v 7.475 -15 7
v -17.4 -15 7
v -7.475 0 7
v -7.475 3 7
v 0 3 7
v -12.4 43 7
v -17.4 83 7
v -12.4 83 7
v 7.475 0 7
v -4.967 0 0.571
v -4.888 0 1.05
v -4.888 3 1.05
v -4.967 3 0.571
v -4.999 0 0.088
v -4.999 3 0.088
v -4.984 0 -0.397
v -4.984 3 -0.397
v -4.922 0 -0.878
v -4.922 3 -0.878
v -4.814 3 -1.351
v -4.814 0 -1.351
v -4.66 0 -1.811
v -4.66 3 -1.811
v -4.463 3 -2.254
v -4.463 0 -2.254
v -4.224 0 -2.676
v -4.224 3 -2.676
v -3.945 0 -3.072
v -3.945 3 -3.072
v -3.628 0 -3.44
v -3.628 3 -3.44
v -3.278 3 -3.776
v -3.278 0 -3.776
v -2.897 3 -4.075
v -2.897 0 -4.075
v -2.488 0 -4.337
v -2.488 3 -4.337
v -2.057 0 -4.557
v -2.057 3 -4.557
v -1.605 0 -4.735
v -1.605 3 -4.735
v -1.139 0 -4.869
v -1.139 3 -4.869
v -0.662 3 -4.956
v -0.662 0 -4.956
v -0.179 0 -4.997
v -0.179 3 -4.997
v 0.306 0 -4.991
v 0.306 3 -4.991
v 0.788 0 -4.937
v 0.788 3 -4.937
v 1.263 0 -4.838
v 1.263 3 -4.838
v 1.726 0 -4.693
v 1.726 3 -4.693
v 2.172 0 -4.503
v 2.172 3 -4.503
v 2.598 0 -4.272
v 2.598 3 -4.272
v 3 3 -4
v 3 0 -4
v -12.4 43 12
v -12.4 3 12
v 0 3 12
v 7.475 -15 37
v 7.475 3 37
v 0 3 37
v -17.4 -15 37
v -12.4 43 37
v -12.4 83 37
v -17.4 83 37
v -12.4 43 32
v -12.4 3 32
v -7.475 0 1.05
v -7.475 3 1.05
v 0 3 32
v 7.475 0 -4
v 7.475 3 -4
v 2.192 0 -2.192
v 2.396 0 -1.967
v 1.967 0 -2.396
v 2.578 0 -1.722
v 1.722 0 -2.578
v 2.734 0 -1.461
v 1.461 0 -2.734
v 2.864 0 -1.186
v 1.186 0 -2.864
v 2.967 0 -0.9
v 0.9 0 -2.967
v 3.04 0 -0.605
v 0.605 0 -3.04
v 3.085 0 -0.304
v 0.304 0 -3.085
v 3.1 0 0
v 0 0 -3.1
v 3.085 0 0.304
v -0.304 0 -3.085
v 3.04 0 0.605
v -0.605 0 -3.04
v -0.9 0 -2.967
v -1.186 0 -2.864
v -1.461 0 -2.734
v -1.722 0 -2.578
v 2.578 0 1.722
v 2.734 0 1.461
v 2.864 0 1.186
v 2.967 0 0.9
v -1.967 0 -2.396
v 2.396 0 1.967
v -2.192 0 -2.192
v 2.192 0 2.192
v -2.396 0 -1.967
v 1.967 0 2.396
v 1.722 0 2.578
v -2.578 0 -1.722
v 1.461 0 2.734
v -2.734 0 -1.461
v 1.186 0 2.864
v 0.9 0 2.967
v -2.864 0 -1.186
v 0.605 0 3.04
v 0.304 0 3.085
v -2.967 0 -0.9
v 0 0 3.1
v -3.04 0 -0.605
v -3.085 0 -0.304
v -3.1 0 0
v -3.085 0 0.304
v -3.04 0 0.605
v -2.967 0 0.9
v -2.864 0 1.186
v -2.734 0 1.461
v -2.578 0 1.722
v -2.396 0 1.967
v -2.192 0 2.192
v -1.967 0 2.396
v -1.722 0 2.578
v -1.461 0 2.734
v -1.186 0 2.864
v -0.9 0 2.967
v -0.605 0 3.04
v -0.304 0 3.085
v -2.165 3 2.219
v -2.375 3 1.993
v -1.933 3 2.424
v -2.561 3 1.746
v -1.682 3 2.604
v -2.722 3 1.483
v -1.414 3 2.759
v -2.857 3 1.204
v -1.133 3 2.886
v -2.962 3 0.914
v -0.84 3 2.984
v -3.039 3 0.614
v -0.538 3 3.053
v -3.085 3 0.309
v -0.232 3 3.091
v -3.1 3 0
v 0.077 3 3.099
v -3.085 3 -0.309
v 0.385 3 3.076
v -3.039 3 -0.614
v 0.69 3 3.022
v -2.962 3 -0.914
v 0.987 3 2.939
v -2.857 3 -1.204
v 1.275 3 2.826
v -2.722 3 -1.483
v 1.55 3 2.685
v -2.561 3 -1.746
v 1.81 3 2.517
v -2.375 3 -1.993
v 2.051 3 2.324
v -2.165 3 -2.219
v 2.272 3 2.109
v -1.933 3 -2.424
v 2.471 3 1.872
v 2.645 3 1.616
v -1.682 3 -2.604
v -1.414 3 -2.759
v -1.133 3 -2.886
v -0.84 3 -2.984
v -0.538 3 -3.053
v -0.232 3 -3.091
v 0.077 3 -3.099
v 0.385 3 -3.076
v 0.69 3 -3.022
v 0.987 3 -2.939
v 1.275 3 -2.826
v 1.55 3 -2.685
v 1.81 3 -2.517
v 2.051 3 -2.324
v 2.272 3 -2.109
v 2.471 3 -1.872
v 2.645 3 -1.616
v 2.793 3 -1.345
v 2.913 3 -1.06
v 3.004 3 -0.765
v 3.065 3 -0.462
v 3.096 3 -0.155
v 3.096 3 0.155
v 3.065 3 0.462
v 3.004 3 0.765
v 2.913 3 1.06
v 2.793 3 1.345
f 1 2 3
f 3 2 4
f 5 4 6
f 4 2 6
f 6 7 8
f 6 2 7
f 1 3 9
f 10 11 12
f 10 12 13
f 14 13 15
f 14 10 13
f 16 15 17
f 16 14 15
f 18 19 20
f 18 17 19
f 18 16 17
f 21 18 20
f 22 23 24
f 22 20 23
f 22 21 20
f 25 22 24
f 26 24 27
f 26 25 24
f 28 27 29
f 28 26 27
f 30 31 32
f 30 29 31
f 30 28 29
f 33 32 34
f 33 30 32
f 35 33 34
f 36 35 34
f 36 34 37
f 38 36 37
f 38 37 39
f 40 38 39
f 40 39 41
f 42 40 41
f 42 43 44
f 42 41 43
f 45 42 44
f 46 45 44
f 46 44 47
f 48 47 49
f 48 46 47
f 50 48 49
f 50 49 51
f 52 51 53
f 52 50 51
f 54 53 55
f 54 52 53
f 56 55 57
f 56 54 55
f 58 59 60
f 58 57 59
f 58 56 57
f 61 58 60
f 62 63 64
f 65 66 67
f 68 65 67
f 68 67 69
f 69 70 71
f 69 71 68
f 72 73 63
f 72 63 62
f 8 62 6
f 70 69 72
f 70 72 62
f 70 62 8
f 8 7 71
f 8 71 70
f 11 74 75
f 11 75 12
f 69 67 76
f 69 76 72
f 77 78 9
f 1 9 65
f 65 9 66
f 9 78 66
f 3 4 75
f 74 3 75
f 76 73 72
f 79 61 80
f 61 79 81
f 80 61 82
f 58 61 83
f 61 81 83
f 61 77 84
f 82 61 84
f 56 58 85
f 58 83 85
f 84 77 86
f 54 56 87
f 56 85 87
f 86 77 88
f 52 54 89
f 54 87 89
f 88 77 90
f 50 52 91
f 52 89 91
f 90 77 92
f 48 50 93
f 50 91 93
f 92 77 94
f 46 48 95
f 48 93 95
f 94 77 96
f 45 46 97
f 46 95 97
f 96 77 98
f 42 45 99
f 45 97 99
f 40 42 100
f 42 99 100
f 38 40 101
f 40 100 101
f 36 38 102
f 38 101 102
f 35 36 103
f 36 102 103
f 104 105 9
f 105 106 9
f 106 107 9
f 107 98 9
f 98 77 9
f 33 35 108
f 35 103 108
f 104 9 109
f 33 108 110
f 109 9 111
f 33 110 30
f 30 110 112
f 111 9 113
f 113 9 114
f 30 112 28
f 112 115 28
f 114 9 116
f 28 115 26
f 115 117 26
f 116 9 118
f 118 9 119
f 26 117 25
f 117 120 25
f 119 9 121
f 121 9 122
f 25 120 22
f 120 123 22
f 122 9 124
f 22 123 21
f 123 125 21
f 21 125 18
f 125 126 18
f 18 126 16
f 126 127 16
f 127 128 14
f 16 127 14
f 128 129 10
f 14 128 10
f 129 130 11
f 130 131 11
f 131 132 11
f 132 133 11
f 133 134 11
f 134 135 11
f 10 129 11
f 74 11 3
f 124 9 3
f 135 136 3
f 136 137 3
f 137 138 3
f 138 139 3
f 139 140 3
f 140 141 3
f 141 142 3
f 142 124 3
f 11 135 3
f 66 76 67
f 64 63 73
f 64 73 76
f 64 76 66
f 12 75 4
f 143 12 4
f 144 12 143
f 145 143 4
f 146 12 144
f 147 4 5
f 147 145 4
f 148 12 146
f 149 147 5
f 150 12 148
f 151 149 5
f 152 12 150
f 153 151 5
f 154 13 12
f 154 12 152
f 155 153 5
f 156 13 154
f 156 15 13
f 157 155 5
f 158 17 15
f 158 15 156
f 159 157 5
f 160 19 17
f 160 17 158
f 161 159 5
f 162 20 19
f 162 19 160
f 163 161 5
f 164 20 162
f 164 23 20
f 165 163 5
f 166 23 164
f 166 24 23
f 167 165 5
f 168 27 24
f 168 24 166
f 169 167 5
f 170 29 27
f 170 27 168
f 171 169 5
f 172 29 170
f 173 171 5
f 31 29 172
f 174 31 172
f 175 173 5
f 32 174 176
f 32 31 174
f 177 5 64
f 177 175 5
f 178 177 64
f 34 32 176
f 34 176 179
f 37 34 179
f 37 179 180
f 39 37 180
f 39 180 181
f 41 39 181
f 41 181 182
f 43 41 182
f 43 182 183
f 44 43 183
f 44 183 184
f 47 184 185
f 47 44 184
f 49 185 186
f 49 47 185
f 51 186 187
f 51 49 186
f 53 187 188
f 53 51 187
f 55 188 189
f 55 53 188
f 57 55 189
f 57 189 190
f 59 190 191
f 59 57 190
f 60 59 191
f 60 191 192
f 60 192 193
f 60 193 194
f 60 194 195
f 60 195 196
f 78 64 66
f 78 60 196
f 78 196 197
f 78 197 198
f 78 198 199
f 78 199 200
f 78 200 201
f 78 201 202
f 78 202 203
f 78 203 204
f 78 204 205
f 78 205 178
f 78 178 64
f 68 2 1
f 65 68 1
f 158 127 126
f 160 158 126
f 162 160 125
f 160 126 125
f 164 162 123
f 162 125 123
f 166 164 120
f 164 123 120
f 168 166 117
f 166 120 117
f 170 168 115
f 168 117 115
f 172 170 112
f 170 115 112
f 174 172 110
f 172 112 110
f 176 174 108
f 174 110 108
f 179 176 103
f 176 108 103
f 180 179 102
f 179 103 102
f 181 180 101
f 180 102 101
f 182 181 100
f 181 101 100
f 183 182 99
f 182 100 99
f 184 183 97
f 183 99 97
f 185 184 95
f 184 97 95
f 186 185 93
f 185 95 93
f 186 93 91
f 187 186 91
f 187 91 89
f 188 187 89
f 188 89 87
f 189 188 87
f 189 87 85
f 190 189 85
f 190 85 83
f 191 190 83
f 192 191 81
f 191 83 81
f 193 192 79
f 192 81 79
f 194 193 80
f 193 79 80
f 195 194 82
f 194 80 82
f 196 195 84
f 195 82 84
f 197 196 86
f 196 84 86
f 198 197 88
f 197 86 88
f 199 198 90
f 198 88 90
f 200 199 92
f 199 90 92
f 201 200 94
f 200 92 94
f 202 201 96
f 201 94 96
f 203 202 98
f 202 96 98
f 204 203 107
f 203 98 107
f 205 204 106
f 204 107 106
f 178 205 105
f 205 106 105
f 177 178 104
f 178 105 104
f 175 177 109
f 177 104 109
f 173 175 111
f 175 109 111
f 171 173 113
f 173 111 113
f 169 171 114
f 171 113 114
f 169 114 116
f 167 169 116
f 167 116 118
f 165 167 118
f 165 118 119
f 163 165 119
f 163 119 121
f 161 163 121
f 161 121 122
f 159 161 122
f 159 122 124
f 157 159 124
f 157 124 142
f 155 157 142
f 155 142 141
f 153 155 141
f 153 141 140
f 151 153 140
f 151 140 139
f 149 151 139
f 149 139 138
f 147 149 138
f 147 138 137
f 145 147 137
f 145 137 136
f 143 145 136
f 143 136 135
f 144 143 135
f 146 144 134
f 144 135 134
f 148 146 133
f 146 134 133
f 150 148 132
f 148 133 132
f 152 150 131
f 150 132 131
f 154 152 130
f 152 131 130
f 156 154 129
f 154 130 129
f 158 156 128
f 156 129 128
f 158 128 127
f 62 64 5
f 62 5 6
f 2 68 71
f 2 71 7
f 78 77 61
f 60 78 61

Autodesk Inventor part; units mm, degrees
ref_plane "YZ Plane" through (0, 0, 0) normal (1, 0, 0) x (0, 1, 0)
ref_plane "XZ Plane" through (0, 0, 0) normal (0, 1, 0) x (-1, 0, 0)
ref_plane "XY Plane" through (0, 0, 0) normal (0, 0, 1) x (1, 0, 0)
sketch "스케치2" plane through (0, 0, 0) normal (0, 1, 0) x (-1, 0, 0)
  circle A0 centre (0, 0) radius 3.1
  line L0 (0, 0) -> (0, 7)
  line L1 (0, 7) -> (7.475, 7)
  line L2 (7.475, 7) -> (7.475, 1.05)
  circle A1 centre (0, 0) radius 5
  line L3 (7.475, 1.05) -> (4.8885, 1.05)
  line L4 (0, 7) -> (-7.475, 7)
  line L5 (-7.475, 7) -> (-7.475, -5)
  line L6 (-7.475, -5) -> (0, -5)
  line L7 (-7.475, -5) -> (-7.475, -4)
  line L8 (-7.475, -4) -> (-3, -4)
  dimension "d0" = 6.2
  dimension "d1" = 7
  dimension "d2" = 7.475
  dimension "d3" = 5.95
  dimension "d4" = 10
  dimension "d5" = 7.475
  dimension "d21" = 1
extrude "돌출1" add sketch "스케치2" along normal blind 3 contours A1 | A1 L8 L5 L4 L0 | L0 L1 L2 L3 A1
sketch "스케치3" plane through (0, 3, 0) normal (0, 1, 0) x (1, 0, 0)
  line L0 (-7.475, -7) -> (7.475, -7) projected
  line L1 (-7.475, -7) -> (7.475, -7)
  line L2 (7.475, -7) -> (7.475, -37)
  line L3 (7.475, -37) -> (-7.475, -37)
  line L4 (-7.475, -37) -> (-7.475, -7)
  point P0 (0, 0)
  dimension "d8" = 30
extrude "돌출2" add sketch "스케치3" against normal blind 18
sketch "스케치11" plane through (0, 3, 0) normal (0, 1, 0) x (1, 0, 0)
  line L0 (-7.475, -37) -> (7.475, -37) projected
  line L1 (0, -37) -> (-17.4, -37)
  line L2 (-17.4, -37) -> (-17.4, -1.05)
  line L3 (-17.4, -1.05) -> (0, -1.05)
  line L4 (0, -1.05) -> (0, -37)
  line L5 (-7.475, -7) -> (7.475, -7) projected
  line L6 (-17.4, -37) -> (0, -37)
  line L7 (0, -37) -> (0, -7)
  line L8 (0, -7) -> (-17.4, -7)
  line L9 (-17.4, -7) -> (-17.4, -37)
  point P0 (0, 0)
  dimension "d40" = 17.4
extrude "돌출9" add sketch "스케치11" along normal blind 80 and the other way blind 18 contours L1 L2 L8 L5 L4 L0
sketch "스케치12" plane through (0, 83, 0) normal (0, 1, 0) x (1, 0, 0)
  line L0 (0, -7) -> (0, -37) projected
  line L1 (-17.4, -37) -> (0, -37) projected
  line L2 (0, -7) -> (-17.4, -7)
  line L3 (-17.4, -7) -> (-17.4, -37)
  line L4 (-17.4, -37) -> (0, -37)
  line L5 (0, -37) -> (0, -7)
  line L6 (-12.4, -12) -> (-5, -12)
  line L7 (-5, -12) -> (-5, -32)
  line L8 (-5, -32) -> (-12.4, -32)
  line L9 (-12.4, -32) -> (-12.4, -12)
  line L10 (-5, -12) -> (0, -12)
  line L11 (-5, -32) -> (0, -32)
  point P0 (0, 0)
  dimension "d45" = 5
extrude "돌출10" cut sketch "스케치12" against normal blind 80 contours L0 L11 L7 L10 | L7 L8 L9 L6
sketch "스케치13" plane through (7.475, -15, 37) normal (0, 0, 1) x (1, 0, 0)
  line L0 (-7.475, 18) -> (-7.475, 98) projected
  line L1 (-7.475, 18) -> (-19.875, 18)
  line L2 (-19.875, 18) -> (-19.875, 98)
  line L3 (-19.875, 98) -> (-19.875, 58)
  line L4 (-7.475, 18) -> (-19.875, 58)
  line L5 (-24.875, 98) -> (-7.475, 98) projected
  line L6 (-19.875, 98) -> (-7.475, 98)
  line L7 (-7.475, 98) -> (-7.475, 18)
  point P0 (-7.475, 15)
extrude "돌출11" cut sketch "스케치13" against normal blind 80 contours L4 L2 L5 L0
ref_plane "작업 평면5" through (7.475, -15, 52) normal (0, 0, 1) x (1, 0, 0)
sketch "스케치4" plane through (0, 3, 0) normal (0, 1, 0) x (1, 0, 0)
  line L0 (-7.475, -1.05) -> (-7.475, -37) projected
  line L1 (7.475, -7) -> (7.475, -37) projected
  line L2 (-7.475, -37) -> (7.475, -37)
  line L3 (7.475, -37) -> (7.475, -7)
  line L4 (7.475, -7) -> (-7.475, -7)
  line L5 (-7.475, -7) -> (-7.475, -37)
  line L6 (7.475, -7) -> (4.475, -7)
  line L7 (4.475, -7) -> (4.475, -37)
  line L8 (4.475, -37) -> (7.475, -37)
  line L9 (7.475, -37) -> (7.475, -7)
  point P0 (0, 0)
  dimension "d11" = 3
sketch "스케치5" plane through (-7.475, -15, 37) normal (0, 0, 1) x (1, 0, 0)
  line L0 (11.95, 18) -> (11.95, 88) projected
  line L1 (0, 18) -> (0, 0) projected
  line L2 (11.95, 53) -> (0, 18)
  point P0 (7.475, 15)
sketch "스케치6" plane through (0, -15, 0) normal (0, -1, 0) x (1, 0, 0)
  line L0 (7.475, -4) -> (3, -4) projected
  line L1 (7.475, 37) -> (-7.475, 37) projected
  line L2 (7.475, -4) -> (7, -4)
  line L3 (7, -4) -> (7, 37)
  line L4 (7, 37) -> (7.475, 37)
  line L5 (7.475, 37) -> (7.475, -4)
  dimension "d25" = 0.475
sketch "스케치7" plane through (0, 3, 0) normal (0, 1, 0) x (1, 0, 0)
  circle A0 centre (0, 0) radius 3.1 projected
  line L0 (0, 0) -> (25, 0)
  line L1 (25, 0) -> (25, -7)
  line L2 (7, -7) -> (25, -7)
  line L3 (25, -7) -> (25, -37)
  line L4 (25, -37) -> (7, -37)
  line L5 (7, -37) -> (7, -7)
  dimension "d26" = 25
sketch "스케치8" plane through (0, 73, 0) normal (0, 1, 0) x (1, 0, 0)
  line L0 (25, -7) -> (25, -37) projected
  line L1 (4.475, -7) -> (4.475, -37) projected
  line L2 (25, -7) -> (4.475, -7)
  line L3 (4.475, -7) -> (4.475, -37)
  line L4 (4.475, -37) -> (25, -37)
  line L5 (25, -37) -> (25, -7)
  line L6 (4.475, -10) -> (-7.475, -10) projected
  line L7 (4.475, -10) -> (20, -10)
  line L8 (20, -10) -> (20, -34)
  line L9 (20, -34) -> (4.475, -34)
  line L10 (4.475, -34) -> (4.475, -10)
  point P0 (0, 0)
  dimension "d31" = 15.525
sketch "스케치9" plane through (4.475, 38, 37) normal (0, 0, 1) x (1, 0, 0)
  line L0 (0, 0) -> (0, 35) projected
  line L1 (15.525, 35) -> (15.525, -35) projected
  line L2 (0, 0) -> (15.525, 35)
  line L3 (15.525, 35) -> (0, 35)
  line L4 (0, 0) -> (0, 35)
  point P0 (-4.475, -38)
sketch "스케치10" plane through (-7.475, -15, 37) normal (0, 0, 1) x (1, 0, 0)
  line L0 (27.475, 88) -> (27.475, 18) projected
  line L1 (11.95, 53) -> (0, 18) projected
  line L2 (27.475, 88) -> (0, 18)
  line L3 (0, 18) -> (27.475, 18)
  line L4 (32.475, 88) -> (27.475, 88) projected
  line L5 (27.475, 18) -> (27.475, 88)
  line L6 (27.475, 88) -> (27.475, 53)
  line L7 (0, 18) -> (27.475, 53)
  line L8 (0, 18) -> (11.95, 53)
  line L9 (27.475, 88) -> (11.95, 53)
  point P0 (7.475, 15)
ref_plane "작업 평면4" through (7.475, 3, 82) normal (0, 0, -1) x (-1, 0, 0)
properties part number "motor_limit_1"
